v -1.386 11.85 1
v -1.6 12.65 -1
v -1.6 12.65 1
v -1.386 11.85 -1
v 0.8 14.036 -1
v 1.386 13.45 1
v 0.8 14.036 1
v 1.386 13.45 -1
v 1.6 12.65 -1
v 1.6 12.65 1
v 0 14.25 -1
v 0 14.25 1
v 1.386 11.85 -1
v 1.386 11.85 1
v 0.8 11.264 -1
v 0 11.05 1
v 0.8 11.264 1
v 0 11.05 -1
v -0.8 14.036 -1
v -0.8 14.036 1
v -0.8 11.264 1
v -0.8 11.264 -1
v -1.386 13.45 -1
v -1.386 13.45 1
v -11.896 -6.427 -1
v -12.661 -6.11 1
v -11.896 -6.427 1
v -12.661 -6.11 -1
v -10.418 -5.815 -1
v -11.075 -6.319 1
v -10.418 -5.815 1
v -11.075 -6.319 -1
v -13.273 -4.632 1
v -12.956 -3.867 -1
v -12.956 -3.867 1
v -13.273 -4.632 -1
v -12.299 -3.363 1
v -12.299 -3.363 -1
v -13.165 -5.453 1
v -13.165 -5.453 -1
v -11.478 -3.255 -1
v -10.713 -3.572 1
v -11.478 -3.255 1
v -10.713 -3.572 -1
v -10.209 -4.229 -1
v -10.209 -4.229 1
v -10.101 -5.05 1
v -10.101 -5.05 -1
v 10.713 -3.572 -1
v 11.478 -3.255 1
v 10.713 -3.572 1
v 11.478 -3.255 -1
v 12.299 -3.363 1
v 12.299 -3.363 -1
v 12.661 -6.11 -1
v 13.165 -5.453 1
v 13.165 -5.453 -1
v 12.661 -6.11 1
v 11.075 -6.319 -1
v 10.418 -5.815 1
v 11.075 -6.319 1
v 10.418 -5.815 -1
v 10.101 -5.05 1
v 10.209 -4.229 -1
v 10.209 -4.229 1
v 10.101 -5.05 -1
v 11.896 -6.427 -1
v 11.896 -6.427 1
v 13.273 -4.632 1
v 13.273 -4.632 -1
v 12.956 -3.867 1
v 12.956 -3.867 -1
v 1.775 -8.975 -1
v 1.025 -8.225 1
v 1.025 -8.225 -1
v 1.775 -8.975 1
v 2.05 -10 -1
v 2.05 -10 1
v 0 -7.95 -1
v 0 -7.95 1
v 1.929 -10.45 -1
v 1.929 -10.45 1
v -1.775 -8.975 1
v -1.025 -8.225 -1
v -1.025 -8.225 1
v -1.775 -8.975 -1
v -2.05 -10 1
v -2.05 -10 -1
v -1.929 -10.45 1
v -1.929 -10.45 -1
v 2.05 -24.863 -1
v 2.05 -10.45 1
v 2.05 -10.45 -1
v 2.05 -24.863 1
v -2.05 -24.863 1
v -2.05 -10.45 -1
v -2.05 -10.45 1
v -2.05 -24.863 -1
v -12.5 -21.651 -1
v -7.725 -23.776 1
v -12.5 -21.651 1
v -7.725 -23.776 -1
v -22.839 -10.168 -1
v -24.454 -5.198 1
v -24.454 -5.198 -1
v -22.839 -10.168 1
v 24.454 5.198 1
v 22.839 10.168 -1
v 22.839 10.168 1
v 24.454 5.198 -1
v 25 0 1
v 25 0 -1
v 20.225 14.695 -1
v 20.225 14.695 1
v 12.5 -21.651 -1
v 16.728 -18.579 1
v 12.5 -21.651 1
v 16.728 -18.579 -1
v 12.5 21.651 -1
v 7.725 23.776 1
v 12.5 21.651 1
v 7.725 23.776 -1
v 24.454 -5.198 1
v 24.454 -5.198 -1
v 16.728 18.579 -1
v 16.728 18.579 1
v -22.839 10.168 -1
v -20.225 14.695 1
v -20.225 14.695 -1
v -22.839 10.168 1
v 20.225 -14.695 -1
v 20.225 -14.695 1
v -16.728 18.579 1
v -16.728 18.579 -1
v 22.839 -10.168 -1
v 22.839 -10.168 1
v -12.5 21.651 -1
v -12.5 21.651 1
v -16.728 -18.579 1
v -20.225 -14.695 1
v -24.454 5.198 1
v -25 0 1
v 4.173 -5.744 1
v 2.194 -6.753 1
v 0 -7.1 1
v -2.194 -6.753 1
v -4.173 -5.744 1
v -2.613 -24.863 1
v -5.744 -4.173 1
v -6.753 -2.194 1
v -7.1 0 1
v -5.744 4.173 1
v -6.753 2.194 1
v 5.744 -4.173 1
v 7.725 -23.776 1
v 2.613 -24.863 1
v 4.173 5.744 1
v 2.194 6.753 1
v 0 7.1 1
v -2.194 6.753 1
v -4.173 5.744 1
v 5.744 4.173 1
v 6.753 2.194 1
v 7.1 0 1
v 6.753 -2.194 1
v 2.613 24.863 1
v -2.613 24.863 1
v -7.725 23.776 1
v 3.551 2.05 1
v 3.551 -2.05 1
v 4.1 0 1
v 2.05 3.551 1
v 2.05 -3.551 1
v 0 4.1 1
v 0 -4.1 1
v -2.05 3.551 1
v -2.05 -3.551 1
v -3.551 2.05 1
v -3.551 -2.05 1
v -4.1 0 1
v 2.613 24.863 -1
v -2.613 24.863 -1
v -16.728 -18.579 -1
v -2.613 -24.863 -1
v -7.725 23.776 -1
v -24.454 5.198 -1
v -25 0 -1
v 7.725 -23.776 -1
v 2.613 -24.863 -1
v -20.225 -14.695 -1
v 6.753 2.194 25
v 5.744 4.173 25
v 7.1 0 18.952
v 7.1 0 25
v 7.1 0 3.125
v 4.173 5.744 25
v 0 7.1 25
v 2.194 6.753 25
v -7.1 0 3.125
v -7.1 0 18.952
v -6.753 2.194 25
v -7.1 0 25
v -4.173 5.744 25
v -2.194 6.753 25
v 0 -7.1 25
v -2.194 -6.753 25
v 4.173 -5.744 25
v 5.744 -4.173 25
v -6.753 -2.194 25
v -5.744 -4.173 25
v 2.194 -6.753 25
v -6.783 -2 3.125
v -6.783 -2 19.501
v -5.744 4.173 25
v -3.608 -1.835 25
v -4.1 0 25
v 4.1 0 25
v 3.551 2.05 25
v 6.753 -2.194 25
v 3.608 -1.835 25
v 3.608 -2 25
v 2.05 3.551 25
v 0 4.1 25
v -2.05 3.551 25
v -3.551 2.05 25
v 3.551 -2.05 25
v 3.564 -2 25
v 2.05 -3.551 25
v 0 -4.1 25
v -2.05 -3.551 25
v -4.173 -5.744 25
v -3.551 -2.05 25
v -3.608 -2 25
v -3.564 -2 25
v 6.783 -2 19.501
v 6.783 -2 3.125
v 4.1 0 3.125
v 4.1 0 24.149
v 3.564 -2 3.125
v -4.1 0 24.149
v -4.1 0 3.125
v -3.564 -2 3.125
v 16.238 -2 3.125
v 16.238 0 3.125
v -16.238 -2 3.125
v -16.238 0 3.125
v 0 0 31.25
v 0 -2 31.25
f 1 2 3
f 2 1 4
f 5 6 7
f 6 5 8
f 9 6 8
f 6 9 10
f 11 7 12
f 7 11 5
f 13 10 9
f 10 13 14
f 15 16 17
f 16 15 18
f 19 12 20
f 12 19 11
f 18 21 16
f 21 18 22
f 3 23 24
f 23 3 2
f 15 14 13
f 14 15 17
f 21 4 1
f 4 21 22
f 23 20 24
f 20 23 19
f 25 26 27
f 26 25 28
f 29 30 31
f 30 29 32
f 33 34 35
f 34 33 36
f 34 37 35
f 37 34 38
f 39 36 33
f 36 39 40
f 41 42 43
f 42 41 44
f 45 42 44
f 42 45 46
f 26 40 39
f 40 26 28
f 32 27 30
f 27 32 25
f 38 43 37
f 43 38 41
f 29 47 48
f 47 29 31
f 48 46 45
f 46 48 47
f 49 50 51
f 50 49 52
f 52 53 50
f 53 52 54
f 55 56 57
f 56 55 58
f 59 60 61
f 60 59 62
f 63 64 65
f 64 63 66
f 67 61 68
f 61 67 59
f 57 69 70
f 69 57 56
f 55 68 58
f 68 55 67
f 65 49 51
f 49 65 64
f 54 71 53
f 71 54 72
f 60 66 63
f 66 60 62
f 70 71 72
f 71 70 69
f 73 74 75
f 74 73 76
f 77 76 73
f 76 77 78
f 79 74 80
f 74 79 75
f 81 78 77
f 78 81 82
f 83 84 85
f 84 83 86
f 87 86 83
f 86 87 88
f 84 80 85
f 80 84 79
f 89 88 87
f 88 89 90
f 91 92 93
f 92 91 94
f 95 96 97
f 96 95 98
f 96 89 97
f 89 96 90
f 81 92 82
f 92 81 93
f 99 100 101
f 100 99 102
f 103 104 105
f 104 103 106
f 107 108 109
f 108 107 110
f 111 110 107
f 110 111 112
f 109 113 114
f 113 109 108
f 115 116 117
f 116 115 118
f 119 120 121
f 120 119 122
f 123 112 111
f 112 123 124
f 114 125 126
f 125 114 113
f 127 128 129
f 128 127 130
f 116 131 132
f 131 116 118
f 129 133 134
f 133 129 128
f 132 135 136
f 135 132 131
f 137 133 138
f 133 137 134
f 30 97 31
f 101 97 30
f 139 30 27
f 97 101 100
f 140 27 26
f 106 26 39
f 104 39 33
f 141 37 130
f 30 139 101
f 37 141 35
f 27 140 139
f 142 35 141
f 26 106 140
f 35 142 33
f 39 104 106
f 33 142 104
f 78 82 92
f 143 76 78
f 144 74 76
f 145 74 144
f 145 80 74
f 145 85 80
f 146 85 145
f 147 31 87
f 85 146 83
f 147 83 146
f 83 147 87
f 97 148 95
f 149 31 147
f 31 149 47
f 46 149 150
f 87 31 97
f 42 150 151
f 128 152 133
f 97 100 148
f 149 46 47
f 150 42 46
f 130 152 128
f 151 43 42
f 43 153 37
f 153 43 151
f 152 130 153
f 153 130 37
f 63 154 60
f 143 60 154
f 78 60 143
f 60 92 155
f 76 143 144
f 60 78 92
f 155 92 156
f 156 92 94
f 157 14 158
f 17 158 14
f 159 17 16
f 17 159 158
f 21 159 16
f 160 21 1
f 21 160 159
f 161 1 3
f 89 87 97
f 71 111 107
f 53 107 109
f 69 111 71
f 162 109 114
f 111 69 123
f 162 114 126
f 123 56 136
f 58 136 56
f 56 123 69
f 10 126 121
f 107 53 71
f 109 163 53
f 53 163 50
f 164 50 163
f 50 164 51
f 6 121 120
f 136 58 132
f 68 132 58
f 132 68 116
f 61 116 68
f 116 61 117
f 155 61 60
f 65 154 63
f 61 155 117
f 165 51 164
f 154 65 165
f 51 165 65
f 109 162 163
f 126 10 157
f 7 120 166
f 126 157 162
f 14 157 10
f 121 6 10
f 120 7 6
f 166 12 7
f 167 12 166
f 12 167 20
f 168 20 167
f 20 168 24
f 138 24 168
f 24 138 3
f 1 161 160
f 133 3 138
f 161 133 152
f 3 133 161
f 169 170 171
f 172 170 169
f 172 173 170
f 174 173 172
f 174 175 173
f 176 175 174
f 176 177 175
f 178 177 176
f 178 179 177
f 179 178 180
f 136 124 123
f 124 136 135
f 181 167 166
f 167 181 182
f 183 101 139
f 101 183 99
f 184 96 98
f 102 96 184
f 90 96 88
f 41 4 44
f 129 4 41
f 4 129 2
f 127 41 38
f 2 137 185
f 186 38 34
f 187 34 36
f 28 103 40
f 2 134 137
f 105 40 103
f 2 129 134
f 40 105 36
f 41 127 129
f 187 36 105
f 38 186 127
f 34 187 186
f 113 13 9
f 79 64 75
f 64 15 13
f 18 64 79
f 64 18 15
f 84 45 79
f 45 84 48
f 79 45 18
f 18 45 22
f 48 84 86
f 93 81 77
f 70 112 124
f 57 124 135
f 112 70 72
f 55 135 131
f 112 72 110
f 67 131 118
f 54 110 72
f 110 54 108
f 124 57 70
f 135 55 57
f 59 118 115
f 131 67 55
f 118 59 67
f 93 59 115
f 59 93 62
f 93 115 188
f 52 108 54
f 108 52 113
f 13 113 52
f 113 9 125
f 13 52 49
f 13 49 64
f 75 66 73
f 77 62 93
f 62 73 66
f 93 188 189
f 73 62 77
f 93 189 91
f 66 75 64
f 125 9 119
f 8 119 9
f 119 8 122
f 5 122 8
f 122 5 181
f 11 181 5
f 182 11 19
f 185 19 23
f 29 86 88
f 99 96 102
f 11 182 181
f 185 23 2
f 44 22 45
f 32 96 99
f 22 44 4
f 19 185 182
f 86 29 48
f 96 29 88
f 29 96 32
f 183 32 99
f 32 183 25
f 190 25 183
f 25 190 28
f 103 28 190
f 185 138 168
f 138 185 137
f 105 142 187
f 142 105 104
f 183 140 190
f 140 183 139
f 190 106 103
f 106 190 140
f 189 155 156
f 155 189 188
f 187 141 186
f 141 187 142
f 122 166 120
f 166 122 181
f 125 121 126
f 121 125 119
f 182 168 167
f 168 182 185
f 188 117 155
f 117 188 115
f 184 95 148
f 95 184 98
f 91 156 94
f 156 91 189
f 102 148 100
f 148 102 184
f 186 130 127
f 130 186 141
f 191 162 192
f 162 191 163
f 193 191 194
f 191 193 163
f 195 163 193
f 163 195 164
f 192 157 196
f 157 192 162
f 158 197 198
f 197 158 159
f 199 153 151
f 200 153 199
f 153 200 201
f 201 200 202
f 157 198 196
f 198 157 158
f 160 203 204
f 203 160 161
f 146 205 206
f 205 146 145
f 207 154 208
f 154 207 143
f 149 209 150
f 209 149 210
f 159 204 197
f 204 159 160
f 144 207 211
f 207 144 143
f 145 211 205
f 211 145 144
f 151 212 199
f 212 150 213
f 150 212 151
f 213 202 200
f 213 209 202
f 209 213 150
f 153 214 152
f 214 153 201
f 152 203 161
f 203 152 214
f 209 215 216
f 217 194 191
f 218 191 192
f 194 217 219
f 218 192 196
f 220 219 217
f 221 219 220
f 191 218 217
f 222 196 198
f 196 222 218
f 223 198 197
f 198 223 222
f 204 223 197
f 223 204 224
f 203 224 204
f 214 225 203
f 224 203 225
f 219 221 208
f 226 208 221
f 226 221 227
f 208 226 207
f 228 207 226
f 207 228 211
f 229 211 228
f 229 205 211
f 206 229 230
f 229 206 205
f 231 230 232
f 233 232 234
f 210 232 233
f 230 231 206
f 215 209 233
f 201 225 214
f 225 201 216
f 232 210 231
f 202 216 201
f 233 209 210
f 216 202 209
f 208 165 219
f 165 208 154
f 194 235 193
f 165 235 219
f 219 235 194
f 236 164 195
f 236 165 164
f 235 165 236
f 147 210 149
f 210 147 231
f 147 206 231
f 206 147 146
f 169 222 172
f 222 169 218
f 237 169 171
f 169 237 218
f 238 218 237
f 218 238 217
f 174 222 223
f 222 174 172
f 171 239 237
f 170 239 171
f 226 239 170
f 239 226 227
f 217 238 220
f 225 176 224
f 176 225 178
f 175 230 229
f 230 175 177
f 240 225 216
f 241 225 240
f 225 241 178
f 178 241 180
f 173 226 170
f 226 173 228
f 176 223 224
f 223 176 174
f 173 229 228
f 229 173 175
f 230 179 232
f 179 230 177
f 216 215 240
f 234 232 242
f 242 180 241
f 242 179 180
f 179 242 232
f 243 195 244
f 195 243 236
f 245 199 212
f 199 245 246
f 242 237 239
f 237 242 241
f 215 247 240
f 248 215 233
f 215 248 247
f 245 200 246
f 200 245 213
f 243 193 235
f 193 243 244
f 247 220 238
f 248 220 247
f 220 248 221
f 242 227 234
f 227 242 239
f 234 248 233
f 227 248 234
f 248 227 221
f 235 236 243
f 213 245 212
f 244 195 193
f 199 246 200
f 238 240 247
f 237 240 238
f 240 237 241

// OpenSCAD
// file: common.scad
/*
 * Written by Dermot Tynan, Kalopa Research.
 * GPLv2.
 *
 * All dimensions are in mm.
 */

wall_thickness = 2;

cap_radius = 25;
cap_height = 24;
inner_radius = 14;
screw_post_radius = 3;

gland_position = -10;

wind_shaft_diameter = 4.5;
bearing_height = 5;
bearing_diameter = 13.2;

mast_diameter = 8.1;
mast_collar_length = 20;

rg_angle = 112.5;

/*
 * Define the top/bottom end cap for the piece. The shaft radius is used to specify if the end cap has a shaft hole.
 */
module end_cap(shaft_radius)
{
	union() {
		/*
		 * End Cap
		 */
		if (shaft_radius > 0) {
			difference() {
				color([0.3, 0, 1]) cylinder(r = cap_radius, h = wall_thickness, center = true);
				cylinder(r = shaft_radius, h = wall_thickness + 1, center = true, $fn = 12);
			}
		} else {
			color([0.3, 0, 1]) cylinder(r = cap_radius, h = wall_thickness, center = true);
		}
		/*
		 * Ridge around the end cap.
		 */
		translate([0, 0, wall_thickness / 2])
			difference() {
				color([0.3, 0, 1]) cylinder(r = cap_radius, h = wall_thickness, center = true);
				cylinder(r = cap_radius - 1, h = wall_thickness + 1, center = true);
			}
	}
}

/*
 * Screw holes for mounting to top section...
 */
module m3_screw_hole()
{
	translate([0, inner_radius - screw_post_radius + 3.3/2, 0])
		cylinder(r = 3.2/2, h = wall_thickness + 1, center = true, $fn = 12);
}

module screw_holes()
{
	m3_screw_hole();
	rotate(a = [0, 0, rg_angle])
		m3_screw_hole();
	rotate(a = [0, 0, -rg_angle])
		m3_screw_hole();
}
// main file
/*
 * Written by Dermot Tynan, Kalopa Research.
 * GPLv2.
 *
 * All dimensions are in mm.
 */

include <common.scad>

cable_width = 4.1;

mast_diameter = 8.2;
collar_height = 25;
collar_thickness = 3;

module cable_slot()
{
	union() {
		translate([0, gland_position, 2])
			cylinder(r = cable_width/2, h = 8, center = true, $fn = 12);
		translate([0, -cap_radius + cable_width/2, 0])
			cube([cable_width, cap_radius, 8], center = true);
	}
}

module collar_support()
{
	translate([0, 0, collar_height/2])
		rotate(a = [90, 30, 0])
			cylinder(r = collar_height * 0.75, h = wall_thickness, $fn = 3);
}

module mhl_base()
{
	collar_radius = collar_thickness + mast_diameter/2;
	union() {
		/*
		 * Base cap, mounting holes and cable slot.
		 */
		difference() {
			color([0.3, 0, 1]) cylinder(r = cap_radius, h = wall_thickness, center = true);
			screw_holes();
			cable_slot();
		}
		/*
		 * Mast collar.
		 */
		translate([0, 0, collar_height/2])
			difference() {
				cylinder(r = collar_radius, h = collar_height, center = true, $fn = 20);
				cylinder(r = mast_diameter/2, h = collar_height + 2, center = true, $fn = 12);
			}
		/*
		 * Collar supports.
		 */
		difference() {
			collar_support();
			%cube([collar_radius, collar_radius, collar_height]);
		}
	}
}

mhl_base();
